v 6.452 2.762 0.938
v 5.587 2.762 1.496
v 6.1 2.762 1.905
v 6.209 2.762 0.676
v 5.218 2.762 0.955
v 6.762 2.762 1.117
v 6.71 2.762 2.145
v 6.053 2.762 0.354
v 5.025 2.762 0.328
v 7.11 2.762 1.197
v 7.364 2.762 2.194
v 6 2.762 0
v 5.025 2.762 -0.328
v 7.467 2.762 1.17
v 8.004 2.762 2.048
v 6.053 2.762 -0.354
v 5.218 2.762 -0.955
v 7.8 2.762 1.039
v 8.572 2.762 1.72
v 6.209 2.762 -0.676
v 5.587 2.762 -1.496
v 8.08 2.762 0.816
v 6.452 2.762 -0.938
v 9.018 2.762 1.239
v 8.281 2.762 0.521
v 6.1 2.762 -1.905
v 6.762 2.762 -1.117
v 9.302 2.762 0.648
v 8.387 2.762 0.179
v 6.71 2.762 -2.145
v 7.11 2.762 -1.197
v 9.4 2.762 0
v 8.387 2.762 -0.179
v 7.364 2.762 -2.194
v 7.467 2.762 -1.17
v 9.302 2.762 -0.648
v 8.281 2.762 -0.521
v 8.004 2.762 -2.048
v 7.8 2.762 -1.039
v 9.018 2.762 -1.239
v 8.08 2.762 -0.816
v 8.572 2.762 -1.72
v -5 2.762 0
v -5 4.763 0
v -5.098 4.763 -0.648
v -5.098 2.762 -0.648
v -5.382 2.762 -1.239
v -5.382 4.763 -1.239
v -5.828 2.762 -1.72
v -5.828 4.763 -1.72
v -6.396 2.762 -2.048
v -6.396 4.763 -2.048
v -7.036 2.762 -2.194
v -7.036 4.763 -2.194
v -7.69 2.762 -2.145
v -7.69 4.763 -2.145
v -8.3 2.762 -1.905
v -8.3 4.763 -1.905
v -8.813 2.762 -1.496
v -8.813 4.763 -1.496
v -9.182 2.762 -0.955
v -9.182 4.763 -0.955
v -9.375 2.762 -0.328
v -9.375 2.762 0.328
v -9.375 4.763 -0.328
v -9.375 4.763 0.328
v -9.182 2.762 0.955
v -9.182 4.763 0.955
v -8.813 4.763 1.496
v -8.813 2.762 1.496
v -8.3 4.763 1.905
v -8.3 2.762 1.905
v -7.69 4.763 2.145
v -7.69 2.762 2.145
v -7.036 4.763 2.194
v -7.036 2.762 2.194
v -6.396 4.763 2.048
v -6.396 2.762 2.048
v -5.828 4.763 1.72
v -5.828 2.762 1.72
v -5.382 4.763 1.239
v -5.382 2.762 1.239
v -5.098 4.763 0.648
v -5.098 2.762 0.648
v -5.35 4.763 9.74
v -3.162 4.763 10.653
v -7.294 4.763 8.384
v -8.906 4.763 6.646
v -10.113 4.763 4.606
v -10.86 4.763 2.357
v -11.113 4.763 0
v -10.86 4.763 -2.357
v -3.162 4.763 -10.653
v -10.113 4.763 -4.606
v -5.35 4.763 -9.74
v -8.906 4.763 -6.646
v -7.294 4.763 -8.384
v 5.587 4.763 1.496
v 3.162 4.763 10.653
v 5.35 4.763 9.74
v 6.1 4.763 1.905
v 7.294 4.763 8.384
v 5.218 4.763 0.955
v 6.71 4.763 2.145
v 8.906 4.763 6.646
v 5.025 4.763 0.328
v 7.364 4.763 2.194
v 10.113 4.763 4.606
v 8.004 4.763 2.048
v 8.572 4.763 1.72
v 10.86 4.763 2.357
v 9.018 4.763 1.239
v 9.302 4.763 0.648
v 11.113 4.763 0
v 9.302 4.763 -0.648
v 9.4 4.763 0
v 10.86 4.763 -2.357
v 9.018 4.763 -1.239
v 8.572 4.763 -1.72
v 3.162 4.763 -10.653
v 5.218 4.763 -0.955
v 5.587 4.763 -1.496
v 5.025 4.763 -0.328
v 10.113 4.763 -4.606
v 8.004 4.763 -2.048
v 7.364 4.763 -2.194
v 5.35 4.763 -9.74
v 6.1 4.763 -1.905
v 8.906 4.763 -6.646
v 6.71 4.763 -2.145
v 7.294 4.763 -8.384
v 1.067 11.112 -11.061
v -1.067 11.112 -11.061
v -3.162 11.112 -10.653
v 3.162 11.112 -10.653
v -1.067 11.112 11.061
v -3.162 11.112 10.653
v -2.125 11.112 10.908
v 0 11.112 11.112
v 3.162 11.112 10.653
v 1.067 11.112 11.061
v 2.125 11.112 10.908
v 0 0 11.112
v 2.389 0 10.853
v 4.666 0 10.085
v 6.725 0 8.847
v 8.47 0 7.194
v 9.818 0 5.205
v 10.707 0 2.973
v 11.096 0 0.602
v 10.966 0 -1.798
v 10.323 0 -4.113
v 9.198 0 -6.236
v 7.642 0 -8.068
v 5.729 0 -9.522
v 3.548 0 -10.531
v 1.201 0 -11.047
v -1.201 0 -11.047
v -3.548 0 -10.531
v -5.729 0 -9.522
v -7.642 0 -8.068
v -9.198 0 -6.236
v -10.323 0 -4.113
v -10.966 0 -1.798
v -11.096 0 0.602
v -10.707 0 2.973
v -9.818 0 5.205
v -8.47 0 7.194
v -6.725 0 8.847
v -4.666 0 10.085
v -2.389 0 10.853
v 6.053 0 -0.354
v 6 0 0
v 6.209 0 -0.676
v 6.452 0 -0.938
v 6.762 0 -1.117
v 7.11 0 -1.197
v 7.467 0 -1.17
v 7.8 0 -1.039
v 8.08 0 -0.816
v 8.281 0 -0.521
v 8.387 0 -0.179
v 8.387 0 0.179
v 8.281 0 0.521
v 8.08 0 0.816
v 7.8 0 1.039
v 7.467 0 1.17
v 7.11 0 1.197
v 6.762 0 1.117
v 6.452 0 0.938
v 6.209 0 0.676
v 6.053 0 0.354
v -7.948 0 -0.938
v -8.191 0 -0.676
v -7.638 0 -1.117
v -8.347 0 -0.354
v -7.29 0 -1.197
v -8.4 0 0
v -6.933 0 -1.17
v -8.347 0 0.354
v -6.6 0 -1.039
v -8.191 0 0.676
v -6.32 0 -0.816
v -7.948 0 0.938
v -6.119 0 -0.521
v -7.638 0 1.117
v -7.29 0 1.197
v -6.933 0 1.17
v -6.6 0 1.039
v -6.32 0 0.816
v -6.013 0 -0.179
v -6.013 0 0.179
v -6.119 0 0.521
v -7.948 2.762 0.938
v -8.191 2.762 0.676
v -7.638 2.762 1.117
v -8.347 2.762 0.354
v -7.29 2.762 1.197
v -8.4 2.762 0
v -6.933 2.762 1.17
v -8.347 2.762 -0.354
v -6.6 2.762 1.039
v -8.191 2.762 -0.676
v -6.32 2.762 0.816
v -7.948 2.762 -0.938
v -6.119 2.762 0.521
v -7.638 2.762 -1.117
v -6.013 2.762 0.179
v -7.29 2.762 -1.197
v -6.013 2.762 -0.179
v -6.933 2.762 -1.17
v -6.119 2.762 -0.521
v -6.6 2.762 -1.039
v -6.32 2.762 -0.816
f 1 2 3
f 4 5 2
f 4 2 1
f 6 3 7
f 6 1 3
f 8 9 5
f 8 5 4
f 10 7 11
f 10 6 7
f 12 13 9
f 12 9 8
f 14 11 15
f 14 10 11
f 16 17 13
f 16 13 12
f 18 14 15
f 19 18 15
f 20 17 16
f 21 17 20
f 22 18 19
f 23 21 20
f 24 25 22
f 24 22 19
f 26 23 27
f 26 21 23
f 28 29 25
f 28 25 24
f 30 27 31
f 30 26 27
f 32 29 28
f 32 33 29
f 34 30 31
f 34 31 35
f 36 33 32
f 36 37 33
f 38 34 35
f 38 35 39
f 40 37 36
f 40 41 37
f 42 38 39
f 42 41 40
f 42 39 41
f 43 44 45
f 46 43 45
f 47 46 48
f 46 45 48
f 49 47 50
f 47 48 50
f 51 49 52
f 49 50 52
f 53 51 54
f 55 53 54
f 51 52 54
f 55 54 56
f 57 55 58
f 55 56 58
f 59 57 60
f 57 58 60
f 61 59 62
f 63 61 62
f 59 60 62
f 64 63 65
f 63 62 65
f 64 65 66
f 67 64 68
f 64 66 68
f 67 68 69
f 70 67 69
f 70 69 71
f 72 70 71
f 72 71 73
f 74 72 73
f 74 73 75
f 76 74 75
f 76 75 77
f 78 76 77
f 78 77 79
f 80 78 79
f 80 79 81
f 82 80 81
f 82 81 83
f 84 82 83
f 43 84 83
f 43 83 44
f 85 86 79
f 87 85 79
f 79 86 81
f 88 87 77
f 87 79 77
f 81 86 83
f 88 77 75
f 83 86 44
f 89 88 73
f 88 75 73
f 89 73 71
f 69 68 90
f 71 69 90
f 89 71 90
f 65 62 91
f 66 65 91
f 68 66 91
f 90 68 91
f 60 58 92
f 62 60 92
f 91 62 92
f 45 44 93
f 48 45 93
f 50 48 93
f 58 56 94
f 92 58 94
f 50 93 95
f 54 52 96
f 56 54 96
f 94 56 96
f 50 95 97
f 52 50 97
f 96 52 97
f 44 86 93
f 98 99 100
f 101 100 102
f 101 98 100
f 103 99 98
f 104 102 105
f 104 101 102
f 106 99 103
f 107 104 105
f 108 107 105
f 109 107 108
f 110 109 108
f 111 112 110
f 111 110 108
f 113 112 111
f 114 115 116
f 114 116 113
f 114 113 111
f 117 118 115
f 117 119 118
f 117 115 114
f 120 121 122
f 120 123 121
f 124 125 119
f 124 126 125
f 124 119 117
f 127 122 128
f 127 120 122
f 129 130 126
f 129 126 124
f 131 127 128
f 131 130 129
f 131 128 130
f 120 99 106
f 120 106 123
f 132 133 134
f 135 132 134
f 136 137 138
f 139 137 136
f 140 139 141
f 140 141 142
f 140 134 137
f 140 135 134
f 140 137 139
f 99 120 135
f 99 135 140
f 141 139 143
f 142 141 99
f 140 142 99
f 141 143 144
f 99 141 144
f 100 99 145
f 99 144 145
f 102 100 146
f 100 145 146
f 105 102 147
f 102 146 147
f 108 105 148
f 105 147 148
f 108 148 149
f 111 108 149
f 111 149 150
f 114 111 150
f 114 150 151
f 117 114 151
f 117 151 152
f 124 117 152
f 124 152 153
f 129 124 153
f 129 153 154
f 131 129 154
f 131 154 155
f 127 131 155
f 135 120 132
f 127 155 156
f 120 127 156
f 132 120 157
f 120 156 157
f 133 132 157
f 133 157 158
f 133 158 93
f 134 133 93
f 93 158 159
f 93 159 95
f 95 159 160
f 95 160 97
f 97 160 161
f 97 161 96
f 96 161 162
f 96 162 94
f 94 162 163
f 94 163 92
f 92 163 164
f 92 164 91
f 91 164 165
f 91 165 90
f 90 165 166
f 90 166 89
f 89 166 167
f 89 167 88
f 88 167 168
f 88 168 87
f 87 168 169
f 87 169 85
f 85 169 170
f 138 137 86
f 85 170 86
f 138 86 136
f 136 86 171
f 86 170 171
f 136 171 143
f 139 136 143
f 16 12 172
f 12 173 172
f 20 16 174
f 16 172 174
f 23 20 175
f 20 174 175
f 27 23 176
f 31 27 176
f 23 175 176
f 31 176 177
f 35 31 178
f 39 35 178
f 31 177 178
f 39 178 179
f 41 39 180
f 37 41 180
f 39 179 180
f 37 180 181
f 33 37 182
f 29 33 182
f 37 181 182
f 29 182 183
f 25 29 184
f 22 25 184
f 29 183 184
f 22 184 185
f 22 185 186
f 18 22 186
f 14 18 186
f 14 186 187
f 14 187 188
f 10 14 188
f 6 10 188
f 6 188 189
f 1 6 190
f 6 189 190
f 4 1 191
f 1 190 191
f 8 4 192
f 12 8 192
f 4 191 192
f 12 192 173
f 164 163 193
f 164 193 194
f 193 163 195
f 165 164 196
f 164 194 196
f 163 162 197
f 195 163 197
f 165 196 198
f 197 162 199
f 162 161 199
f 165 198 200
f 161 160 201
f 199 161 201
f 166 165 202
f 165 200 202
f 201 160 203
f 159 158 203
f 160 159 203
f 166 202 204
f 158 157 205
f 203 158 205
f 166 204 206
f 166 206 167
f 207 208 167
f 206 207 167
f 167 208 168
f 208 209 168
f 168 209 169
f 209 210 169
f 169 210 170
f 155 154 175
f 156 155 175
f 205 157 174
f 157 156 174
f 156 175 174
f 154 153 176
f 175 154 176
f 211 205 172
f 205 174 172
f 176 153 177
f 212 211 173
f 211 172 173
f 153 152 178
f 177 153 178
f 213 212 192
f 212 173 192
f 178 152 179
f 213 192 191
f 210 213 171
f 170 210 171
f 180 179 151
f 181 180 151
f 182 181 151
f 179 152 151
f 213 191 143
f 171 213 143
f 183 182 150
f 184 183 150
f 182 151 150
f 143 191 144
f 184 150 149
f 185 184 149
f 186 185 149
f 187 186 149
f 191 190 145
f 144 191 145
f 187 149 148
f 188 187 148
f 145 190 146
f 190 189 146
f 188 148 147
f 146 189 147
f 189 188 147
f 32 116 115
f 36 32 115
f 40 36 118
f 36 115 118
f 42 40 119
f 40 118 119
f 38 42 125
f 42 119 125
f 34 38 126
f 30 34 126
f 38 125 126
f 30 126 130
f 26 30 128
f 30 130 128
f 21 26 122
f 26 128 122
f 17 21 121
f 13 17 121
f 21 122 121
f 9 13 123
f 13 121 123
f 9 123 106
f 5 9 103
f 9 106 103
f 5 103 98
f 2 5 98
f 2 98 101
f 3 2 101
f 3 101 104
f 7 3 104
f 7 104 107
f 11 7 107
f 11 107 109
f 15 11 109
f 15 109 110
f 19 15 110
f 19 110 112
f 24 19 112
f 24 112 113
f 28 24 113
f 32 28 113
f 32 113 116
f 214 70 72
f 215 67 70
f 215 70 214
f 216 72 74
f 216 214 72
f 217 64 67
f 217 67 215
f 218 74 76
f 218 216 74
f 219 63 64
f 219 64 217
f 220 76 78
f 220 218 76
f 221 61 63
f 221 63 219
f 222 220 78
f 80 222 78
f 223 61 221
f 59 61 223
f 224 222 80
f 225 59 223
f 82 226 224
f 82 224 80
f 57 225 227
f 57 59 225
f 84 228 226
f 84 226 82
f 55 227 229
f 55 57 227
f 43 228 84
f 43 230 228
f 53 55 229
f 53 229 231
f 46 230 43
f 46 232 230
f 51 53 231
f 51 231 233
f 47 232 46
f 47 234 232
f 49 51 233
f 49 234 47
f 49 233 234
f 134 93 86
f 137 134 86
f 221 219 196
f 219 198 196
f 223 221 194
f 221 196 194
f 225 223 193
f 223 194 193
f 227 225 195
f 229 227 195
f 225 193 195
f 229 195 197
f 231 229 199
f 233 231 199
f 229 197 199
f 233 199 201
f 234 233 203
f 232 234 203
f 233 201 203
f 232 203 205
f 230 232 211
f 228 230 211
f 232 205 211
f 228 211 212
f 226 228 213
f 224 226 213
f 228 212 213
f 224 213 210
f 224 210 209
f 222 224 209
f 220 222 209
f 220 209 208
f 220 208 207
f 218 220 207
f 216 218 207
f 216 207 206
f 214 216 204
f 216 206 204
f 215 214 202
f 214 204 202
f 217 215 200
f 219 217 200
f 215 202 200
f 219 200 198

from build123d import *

# Parameters (mm, degrees)
SKETCH1_R                      = 11.1125
BOSS_EXTRUDE1_DEPTH            = 11.1125
CUT_EXTRUDE1_START             = -6.35
CUT_EXTRUDE1_DEPTH             = 6.35
CBORE_FOR_M2_SHCS1_D           = 2.4
CBORE_FOR_M2_SHCS1_CBORE_D     = 4.4
CBORE_FOR_M2_SHCS1_CBORE_DEPTH = 2


with BuildPart() as part:
    # Sketch1 → Boss-Extrude1 (new body)
    with BuildSketch(Plane(origin=(0, 0, 0), x_dir=(1, 0, 0), z_dir=(0, 1, 0))):
        with Locations(Location((0, 0, 0), (0, 0, 270))):
            Circle(SKETCH1_R)
    extrude(amount=BOSS_EXTRUDE1_DEPTH)

    # Sketch2 → Cut-Extrude1 (cut)
    with BuildSketch(Plane(origin=(0, 11.1125, 0), x_dir=(1, 0, 0), z_dir=(0, 1, 0)).offset(CUT_EXTRUDE1_START)):
        with BuildLine():
            Line((-3.1623, 10.653051908), (-3.1623, -10.653051908))
            ThreePointArc((-3.1623, -10.653051908), (-11.1125, 0), (-3.1623, 10.653051908))
        make_face()
        with BuildLine():
            Line((3.1623, 10.653051908), (3.1623, -10.653051908))
            ThreePointArc((3.1623, -10.653051908), (11.1125, 0), (3.1623, 10.653051908))
        make_face()
    extrude(amount=CUT_EXTRUDE1_DEPTH, mode=Mode.SUBTRACT)

    # CBORE for M2 SHCS1 (through all)
    with Locations(Plane(origin=(0, 4.7625, 0), x_dir=(1, 0, 0), z_dir=(0, 1, 0))):
        with Locations((-7.2, 0), (7.2, 0)):
            CounterBoreHole(CBORE_FOR_M2_SHCS1_D / 2, CBORE_FOR_M2_SHCS1_CBORE_D / 2, CBORE_FOR_M2_SHCS1_CBORE_DEPTH)


solid = part.part
